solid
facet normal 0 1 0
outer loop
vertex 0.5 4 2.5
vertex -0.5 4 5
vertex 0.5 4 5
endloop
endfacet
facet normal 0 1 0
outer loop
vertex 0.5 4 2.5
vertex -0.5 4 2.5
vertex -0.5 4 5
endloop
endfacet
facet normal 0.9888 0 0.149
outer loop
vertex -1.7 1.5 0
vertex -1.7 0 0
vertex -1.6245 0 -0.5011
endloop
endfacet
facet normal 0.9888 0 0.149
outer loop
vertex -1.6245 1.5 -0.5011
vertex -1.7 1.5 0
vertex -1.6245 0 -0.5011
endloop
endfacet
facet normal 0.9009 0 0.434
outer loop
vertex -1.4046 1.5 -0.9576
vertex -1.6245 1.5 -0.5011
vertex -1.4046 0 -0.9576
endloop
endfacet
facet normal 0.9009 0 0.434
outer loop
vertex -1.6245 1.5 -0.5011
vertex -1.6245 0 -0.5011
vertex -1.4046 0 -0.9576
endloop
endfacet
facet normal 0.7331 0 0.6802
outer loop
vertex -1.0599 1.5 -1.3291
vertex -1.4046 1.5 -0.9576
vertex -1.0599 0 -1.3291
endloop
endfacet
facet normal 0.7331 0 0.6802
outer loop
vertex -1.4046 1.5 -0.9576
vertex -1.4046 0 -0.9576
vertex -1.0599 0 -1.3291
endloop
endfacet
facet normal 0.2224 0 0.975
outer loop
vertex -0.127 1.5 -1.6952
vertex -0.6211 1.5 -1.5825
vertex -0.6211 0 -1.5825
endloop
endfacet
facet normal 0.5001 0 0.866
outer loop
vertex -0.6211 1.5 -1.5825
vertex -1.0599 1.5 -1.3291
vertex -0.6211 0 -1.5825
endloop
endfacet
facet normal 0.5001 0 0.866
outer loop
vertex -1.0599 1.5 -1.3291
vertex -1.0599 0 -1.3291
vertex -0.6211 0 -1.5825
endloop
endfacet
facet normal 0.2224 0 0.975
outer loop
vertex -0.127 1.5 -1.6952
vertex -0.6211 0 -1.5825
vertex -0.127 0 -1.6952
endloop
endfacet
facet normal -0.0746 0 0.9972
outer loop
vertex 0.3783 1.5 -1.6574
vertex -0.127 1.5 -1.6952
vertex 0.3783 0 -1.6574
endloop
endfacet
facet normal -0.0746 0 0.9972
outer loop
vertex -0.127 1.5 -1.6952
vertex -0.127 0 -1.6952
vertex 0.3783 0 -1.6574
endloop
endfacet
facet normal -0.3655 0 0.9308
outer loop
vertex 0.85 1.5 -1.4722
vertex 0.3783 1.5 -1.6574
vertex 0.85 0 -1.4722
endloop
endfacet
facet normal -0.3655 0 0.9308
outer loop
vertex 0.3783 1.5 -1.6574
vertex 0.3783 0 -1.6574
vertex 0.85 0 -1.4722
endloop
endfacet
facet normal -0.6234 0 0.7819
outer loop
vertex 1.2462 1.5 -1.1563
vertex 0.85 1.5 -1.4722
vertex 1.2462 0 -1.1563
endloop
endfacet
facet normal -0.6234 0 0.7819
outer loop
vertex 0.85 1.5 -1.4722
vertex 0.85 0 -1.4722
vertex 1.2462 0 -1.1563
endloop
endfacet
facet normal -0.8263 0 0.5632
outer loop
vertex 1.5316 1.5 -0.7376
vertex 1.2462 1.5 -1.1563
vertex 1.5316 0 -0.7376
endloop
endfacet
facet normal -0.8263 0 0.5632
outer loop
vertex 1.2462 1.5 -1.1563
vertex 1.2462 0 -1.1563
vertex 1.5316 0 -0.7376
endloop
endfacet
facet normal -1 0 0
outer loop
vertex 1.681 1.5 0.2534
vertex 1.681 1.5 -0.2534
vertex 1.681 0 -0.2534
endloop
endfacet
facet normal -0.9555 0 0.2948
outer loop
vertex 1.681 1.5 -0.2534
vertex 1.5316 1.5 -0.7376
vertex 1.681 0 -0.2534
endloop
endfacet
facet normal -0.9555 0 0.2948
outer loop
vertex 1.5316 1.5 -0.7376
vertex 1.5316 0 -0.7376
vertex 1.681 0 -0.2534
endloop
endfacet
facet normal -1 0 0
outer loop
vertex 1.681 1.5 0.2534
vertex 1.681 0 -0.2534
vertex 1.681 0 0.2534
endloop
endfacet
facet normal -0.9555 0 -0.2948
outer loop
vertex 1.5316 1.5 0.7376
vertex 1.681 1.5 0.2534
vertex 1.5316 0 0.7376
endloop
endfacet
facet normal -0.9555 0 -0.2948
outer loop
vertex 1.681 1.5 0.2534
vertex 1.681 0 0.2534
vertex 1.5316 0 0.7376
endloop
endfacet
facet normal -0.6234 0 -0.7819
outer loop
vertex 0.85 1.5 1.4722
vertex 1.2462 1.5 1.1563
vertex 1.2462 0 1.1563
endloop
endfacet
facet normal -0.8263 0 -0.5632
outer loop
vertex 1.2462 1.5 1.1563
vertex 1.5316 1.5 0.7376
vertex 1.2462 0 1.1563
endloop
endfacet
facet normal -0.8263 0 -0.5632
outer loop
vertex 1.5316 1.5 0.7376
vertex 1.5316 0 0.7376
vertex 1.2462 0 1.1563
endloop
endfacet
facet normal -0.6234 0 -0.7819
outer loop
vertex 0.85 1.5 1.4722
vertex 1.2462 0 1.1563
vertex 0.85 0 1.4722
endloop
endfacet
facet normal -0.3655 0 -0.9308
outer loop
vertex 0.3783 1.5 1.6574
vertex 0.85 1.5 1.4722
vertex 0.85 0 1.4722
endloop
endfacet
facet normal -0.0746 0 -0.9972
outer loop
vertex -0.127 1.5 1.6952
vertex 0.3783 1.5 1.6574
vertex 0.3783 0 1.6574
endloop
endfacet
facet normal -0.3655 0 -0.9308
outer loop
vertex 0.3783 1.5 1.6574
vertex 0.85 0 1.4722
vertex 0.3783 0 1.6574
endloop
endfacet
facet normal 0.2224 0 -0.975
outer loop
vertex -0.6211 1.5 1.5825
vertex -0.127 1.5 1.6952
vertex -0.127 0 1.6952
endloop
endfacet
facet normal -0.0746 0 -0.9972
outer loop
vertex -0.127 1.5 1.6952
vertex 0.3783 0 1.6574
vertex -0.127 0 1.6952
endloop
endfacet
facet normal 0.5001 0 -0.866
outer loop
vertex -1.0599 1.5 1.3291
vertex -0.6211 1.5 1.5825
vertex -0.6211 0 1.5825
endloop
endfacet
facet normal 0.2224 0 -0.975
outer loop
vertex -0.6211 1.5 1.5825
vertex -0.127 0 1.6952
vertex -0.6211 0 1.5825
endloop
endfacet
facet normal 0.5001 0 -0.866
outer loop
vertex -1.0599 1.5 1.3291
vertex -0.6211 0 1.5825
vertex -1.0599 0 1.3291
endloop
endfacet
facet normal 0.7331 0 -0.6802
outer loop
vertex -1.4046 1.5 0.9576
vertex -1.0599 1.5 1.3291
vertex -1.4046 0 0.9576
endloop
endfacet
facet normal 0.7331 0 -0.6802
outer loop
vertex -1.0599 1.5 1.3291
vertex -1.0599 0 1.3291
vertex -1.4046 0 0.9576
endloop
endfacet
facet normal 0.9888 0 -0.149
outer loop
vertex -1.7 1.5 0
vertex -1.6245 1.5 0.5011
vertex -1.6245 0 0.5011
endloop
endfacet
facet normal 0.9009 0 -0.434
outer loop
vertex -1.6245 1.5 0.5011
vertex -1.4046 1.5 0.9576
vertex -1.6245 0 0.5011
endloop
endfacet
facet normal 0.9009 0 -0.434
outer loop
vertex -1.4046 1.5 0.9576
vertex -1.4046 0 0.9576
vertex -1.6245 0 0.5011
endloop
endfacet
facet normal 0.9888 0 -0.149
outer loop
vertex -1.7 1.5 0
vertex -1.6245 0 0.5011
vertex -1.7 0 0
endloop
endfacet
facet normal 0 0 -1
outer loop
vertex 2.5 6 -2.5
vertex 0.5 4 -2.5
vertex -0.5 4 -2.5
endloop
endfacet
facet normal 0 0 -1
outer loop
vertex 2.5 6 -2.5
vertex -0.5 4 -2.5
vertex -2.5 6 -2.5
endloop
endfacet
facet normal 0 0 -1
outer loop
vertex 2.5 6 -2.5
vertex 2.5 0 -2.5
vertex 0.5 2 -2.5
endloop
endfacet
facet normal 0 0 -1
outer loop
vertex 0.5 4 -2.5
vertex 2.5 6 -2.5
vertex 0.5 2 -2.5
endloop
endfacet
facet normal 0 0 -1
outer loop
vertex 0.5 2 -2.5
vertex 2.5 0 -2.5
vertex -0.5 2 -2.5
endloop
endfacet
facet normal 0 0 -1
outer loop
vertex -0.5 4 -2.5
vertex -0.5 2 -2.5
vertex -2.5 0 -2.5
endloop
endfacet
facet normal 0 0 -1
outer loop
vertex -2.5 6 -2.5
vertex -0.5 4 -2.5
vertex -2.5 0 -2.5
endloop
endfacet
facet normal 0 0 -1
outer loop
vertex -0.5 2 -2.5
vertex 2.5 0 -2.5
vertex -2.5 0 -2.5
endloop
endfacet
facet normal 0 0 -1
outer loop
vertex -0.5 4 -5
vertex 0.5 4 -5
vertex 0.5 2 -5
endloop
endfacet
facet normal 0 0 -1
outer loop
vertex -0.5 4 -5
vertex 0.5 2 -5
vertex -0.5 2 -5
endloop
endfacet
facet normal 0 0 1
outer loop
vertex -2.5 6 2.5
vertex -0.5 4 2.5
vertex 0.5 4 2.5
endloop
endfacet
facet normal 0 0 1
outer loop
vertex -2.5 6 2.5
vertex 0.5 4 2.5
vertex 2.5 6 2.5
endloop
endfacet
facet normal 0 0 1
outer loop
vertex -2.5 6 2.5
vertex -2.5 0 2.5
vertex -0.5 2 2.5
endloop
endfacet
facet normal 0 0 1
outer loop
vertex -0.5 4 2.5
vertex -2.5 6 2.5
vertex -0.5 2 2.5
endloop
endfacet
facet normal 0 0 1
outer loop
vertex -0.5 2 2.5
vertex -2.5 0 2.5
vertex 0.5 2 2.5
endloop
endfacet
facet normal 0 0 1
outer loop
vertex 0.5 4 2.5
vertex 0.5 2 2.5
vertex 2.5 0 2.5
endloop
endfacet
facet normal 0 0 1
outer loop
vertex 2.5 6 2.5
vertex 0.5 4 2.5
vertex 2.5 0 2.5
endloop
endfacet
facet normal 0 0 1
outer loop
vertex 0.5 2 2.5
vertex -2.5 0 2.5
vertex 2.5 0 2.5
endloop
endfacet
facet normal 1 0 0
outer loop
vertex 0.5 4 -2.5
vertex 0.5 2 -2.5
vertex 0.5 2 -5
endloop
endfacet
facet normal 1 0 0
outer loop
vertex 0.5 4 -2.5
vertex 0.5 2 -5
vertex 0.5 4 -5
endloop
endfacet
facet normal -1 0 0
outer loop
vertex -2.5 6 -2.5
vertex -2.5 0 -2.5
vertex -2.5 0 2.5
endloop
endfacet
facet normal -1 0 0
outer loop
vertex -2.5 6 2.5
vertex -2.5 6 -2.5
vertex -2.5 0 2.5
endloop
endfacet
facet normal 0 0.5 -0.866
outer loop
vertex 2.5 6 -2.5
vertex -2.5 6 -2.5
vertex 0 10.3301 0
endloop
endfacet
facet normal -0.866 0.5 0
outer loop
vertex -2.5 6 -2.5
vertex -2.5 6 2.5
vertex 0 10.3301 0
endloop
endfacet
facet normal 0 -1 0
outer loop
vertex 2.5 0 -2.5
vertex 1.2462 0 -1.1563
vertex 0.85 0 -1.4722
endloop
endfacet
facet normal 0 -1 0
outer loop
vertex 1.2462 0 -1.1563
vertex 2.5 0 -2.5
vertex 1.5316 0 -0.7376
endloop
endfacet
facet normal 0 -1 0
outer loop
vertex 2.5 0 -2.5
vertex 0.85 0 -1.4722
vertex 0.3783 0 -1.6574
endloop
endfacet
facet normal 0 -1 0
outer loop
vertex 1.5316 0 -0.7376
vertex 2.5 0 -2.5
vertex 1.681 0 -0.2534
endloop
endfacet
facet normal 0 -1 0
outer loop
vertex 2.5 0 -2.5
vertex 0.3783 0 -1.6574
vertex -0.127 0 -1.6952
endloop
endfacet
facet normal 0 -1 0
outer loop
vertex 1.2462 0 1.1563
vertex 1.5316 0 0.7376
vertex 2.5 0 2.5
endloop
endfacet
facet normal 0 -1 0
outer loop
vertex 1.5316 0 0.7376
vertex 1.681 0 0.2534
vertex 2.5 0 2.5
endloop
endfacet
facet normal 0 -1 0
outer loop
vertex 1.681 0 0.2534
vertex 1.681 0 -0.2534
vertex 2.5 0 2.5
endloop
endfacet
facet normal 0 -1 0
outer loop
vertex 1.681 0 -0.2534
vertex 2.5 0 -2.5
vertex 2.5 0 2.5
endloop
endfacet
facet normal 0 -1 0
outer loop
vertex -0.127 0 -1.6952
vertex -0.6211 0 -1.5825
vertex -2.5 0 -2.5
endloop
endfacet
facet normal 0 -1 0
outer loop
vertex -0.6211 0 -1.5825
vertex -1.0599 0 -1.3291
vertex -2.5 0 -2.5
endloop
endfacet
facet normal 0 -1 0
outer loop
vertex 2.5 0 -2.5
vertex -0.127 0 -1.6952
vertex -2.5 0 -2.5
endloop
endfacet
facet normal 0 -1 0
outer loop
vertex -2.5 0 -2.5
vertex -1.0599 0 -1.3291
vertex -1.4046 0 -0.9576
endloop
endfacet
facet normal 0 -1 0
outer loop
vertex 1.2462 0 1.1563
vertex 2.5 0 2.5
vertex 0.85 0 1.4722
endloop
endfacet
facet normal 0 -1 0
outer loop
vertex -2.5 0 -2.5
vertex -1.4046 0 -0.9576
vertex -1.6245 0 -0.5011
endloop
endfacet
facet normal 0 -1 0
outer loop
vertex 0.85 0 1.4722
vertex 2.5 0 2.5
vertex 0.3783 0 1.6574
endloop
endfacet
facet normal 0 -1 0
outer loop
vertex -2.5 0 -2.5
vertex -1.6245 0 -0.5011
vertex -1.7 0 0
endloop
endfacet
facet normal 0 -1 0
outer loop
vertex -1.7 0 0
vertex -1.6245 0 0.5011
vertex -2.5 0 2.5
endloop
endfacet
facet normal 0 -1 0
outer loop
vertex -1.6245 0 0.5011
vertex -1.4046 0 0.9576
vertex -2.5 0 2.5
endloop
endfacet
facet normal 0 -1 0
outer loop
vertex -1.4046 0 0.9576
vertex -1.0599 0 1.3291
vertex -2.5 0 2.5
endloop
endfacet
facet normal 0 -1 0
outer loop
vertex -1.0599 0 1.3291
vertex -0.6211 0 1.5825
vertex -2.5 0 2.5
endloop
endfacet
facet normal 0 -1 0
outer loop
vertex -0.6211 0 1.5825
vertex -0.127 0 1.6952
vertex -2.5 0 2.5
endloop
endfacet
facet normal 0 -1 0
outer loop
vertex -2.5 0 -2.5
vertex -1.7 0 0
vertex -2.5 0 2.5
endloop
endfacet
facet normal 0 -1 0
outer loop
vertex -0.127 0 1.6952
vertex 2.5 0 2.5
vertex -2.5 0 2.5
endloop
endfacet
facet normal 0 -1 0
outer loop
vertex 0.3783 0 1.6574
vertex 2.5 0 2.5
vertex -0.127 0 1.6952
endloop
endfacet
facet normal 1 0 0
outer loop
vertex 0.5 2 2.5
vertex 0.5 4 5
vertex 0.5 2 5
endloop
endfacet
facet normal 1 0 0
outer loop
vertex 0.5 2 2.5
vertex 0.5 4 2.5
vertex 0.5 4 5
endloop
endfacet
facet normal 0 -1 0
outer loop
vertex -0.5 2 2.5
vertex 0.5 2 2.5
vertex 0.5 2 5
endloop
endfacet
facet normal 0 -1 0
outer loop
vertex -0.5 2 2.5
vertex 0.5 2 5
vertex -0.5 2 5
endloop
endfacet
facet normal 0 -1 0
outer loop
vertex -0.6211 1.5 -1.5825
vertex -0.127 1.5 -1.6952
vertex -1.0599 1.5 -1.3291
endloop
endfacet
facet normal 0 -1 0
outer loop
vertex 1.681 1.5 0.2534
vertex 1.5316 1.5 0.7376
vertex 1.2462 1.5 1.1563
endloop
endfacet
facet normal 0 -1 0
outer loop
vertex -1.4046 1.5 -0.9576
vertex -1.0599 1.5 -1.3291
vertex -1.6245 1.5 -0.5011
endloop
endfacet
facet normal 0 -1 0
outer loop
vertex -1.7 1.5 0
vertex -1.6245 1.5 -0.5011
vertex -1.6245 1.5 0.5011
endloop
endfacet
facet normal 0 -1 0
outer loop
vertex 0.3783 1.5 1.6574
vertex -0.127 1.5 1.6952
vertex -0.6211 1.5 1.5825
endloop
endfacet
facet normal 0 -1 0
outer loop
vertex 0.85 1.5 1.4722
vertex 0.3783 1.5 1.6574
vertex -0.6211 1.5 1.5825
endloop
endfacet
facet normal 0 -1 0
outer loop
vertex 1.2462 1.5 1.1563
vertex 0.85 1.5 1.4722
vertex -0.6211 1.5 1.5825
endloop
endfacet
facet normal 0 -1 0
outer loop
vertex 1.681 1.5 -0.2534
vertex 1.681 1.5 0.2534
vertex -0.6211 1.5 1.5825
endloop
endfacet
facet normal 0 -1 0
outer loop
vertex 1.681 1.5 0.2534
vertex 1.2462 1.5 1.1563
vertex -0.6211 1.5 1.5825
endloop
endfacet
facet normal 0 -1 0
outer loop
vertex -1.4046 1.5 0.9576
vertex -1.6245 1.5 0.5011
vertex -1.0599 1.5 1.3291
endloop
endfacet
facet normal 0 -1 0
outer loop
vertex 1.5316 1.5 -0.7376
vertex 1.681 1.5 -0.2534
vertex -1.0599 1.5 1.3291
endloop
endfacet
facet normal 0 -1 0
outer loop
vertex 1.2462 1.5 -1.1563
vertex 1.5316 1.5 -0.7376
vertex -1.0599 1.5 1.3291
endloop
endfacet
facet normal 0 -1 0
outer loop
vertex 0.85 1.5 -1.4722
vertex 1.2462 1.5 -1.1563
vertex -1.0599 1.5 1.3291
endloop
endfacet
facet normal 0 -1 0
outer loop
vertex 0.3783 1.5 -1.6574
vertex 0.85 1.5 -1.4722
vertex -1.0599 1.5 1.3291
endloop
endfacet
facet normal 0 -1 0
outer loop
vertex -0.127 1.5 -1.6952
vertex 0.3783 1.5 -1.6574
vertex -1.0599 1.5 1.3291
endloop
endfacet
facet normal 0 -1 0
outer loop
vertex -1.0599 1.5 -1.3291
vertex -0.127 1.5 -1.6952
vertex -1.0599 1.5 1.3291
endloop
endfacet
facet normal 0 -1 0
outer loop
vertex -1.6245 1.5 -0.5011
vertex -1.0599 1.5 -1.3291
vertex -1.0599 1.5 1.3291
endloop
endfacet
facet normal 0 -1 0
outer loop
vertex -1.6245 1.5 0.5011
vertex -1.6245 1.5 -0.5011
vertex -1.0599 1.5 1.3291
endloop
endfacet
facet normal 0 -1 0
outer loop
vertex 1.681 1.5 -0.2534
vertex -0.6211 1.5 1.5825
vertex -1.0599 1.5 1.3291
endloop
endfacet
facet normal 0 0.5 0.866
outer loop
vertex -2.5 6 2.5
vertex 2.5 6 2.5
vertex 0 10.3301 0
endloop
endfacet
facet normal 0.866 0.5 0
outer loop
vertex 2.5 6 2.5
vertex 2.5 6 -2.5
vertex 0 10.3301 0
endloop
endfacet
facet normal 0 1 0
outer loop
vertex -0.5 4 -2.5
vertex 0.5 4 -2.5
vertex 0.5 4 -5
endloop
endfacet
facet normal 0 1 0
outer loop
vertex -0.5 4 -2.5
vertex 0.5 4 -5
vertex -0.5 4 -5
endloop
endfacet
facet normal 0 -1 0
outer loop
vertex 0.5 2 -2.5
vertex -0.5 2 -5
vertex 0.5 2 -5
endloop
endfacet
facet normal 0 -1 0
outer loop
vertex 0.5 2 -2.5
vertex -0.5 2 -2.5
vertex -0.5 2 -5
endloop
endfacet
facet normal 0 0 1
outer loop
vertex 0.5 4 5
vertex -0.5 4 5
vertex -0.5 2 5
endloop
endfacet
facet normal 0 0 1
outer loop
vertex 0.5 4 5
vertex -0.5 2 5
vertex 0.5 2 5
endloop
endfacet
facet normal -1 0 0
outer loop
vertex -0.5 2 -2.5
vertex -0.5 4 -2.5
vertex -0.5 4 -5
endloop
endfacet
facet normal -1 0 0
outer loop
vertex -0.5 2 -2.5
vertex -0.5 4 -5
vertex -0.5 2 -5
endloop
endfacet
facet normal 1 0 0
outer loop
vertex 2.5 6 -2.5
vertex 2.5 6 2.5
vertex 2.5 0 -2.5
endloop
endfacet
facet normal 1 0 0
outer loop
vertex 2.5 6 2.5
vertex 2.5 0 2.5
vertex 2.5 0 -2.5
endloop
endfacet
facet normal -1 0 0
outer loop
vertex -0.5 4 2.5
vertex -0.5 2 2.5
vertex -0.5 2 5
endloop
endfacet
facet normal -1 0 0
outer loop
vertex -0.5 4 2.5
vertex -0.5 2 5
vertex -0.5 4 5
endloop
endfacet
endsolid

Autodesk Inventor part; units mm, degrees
ref_plane "YZ Plane" through (0, 0, 0) normal (1, 0, 0) x (0, 1, 0)
ref_plane "XZ Plane" through (0, 0, 0) normal (0, 1, 0) x (-1, 0, 0)
ref_plane "XY Plane" through (0, 0, 0) normal (0, 0, 1) x (1, 0, 0)
sketch "草圖1" plane through (0, 0, 0) normal (0, 1, 0) x (-1, 0, 0)
  line L0 (2.5, 2.5) -> (-2.5, 2.5)
  line L1 (-2.5, 2.5) -> (-2.5, -2.5)
  line L2 (-2.5, -2.5) -> (2.5, -2.5)
  line L3 (2.5, -2.5) -> (2.5, 2.5)
  circle A0 centre (0, 0) radius 1.7
  point P0 (2.5, 0)
  point P1 (0, -2.5)
  dimension "d0" = 5
  dimension "d1" = 5
  dimension "d2" = 3.4
extrude "擠出1" add sketch "草圖1" along normal blind 6 contours L3 L2 L1 L0 | A0
extrude "擠出2" cut sketch "草圖1" along normal blind 1.5 contours A0
sketch "草圖2" plane through (0, 6, 0) normal (0, 1, 0) x (1, 0, 0)
  line L0 (2.5, -2.5) -> (2.5, 2.5) projected
  line L1 (2.5, 2.5) -> (-2.5, 2.5) projected
  line L2 (-2.5, 2.5) -> (-2.5, -2.5) projected
  line L3 (-2.5, -2.5) -> (2.5, -2.5) projected
  point P0 (0, 0)
extrude "擠出3" add sketch "草圖2" along normal blind 15 draft -30
sketch "草圖3" plane through (2.5, 0, -2.5) normal (0, 0, -1) x (-1, 0, 0)
  line L0 (0, 0) -> (5, 0) projected
  line L1 (5, 0) -> (5, 6) projected
  line L2 (0, 6) -> (5, 6) projected
  line L3 (0, 0) -> (0, 6) projected
  line L4 (3, 4) -> (3, 2)
  line L5 (3, 2) -> (2, 2)
  line L6 (2, 2) -> (2, 4)
  line L7 (2, 4) -> (3, 4)
  point P0 (2.5, 0)
  dimension "d9" = 2
extrude "擠出4" add sketch "草圖3" along normal blind 2.5 contours L4 L5 L6 L7
mirror "鏡射1" about plane through (0, 0, 0) normal (0, 0, 1) of "擠出4"
properties part number "110033226_ipt_21_柵欄"
